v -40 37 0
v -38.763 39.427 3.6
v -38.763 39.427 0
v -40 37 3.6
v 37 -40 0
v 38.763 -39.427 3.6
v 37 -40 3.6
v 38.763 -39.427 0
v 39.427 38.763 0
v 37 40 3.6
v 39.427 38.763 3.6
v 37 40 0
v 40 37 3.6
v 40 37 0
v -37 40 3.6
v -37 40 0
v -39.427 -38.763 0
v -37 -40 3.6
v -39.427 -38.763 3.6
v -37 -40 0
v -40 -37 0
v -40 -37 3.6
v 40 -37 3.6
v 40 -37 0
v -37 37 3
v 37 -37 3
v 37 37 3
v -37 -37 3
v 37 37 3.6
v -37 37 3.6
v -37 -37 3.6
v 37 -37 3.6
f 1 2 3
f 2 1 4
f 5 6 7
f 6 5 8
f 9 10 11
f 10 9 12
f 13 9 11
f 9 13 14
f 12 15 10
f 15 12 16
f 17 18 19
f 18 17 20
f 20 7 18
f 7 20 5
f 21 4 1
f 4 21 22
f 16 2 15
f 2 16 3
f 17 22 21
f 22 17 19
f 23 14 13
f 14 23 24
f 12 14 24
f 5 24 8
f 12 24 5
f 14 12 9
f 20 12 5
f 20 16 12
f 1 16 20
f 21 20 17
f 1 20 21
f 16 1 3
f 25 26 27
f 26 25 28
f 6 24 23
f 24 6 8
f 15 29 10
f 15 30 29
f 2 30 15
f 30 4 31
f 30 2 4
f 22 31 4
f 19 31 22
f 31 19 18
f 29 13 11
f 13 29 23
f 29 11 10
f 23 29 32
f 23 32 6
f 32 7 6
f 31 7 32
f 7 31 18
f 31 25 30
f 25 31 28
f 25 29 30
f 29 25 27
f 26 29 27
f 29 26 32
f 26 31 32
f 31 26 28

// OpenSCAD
// qr_plaque/model.scad — fallback plate only.
// The app builds this template with the native Python mesher
// (src/core/litho_mesh.py + src/core/qr.py); OpenSCAD has no QR generator,
// so this fallback renders just the blank plate with border.

plate_w = 80;
plate_h = 80;
size = 80;
frame_width = 3;
corner_r = 3;
base_height = 3;
max_thickness = 0.6;
min_thickness = 0.01;
qr_text = "";
photo_path = "";
photo_cols = 200;
photo_rows = 200;

module rounded_rect(w, h, r) {
  rr = min(r, w/4, h/4);
  offset(r = rr) square([w - 2*rr, h - 2*rr], center = true);
}

union() {
  linear_extrude(height = base_height)
    rounded_rect(size, size, corner_r);
  // border ring at relief height
  translate([0, 0, base_height])
    linear_extrude(height = max_thickness)
      difference() {
        rounded_rect(size, size, corner_r);
        rounded_rect(size - 2*frame_width, size - 2*frame_width,
                     max(0, corner_r - frame_width));
      }
}
